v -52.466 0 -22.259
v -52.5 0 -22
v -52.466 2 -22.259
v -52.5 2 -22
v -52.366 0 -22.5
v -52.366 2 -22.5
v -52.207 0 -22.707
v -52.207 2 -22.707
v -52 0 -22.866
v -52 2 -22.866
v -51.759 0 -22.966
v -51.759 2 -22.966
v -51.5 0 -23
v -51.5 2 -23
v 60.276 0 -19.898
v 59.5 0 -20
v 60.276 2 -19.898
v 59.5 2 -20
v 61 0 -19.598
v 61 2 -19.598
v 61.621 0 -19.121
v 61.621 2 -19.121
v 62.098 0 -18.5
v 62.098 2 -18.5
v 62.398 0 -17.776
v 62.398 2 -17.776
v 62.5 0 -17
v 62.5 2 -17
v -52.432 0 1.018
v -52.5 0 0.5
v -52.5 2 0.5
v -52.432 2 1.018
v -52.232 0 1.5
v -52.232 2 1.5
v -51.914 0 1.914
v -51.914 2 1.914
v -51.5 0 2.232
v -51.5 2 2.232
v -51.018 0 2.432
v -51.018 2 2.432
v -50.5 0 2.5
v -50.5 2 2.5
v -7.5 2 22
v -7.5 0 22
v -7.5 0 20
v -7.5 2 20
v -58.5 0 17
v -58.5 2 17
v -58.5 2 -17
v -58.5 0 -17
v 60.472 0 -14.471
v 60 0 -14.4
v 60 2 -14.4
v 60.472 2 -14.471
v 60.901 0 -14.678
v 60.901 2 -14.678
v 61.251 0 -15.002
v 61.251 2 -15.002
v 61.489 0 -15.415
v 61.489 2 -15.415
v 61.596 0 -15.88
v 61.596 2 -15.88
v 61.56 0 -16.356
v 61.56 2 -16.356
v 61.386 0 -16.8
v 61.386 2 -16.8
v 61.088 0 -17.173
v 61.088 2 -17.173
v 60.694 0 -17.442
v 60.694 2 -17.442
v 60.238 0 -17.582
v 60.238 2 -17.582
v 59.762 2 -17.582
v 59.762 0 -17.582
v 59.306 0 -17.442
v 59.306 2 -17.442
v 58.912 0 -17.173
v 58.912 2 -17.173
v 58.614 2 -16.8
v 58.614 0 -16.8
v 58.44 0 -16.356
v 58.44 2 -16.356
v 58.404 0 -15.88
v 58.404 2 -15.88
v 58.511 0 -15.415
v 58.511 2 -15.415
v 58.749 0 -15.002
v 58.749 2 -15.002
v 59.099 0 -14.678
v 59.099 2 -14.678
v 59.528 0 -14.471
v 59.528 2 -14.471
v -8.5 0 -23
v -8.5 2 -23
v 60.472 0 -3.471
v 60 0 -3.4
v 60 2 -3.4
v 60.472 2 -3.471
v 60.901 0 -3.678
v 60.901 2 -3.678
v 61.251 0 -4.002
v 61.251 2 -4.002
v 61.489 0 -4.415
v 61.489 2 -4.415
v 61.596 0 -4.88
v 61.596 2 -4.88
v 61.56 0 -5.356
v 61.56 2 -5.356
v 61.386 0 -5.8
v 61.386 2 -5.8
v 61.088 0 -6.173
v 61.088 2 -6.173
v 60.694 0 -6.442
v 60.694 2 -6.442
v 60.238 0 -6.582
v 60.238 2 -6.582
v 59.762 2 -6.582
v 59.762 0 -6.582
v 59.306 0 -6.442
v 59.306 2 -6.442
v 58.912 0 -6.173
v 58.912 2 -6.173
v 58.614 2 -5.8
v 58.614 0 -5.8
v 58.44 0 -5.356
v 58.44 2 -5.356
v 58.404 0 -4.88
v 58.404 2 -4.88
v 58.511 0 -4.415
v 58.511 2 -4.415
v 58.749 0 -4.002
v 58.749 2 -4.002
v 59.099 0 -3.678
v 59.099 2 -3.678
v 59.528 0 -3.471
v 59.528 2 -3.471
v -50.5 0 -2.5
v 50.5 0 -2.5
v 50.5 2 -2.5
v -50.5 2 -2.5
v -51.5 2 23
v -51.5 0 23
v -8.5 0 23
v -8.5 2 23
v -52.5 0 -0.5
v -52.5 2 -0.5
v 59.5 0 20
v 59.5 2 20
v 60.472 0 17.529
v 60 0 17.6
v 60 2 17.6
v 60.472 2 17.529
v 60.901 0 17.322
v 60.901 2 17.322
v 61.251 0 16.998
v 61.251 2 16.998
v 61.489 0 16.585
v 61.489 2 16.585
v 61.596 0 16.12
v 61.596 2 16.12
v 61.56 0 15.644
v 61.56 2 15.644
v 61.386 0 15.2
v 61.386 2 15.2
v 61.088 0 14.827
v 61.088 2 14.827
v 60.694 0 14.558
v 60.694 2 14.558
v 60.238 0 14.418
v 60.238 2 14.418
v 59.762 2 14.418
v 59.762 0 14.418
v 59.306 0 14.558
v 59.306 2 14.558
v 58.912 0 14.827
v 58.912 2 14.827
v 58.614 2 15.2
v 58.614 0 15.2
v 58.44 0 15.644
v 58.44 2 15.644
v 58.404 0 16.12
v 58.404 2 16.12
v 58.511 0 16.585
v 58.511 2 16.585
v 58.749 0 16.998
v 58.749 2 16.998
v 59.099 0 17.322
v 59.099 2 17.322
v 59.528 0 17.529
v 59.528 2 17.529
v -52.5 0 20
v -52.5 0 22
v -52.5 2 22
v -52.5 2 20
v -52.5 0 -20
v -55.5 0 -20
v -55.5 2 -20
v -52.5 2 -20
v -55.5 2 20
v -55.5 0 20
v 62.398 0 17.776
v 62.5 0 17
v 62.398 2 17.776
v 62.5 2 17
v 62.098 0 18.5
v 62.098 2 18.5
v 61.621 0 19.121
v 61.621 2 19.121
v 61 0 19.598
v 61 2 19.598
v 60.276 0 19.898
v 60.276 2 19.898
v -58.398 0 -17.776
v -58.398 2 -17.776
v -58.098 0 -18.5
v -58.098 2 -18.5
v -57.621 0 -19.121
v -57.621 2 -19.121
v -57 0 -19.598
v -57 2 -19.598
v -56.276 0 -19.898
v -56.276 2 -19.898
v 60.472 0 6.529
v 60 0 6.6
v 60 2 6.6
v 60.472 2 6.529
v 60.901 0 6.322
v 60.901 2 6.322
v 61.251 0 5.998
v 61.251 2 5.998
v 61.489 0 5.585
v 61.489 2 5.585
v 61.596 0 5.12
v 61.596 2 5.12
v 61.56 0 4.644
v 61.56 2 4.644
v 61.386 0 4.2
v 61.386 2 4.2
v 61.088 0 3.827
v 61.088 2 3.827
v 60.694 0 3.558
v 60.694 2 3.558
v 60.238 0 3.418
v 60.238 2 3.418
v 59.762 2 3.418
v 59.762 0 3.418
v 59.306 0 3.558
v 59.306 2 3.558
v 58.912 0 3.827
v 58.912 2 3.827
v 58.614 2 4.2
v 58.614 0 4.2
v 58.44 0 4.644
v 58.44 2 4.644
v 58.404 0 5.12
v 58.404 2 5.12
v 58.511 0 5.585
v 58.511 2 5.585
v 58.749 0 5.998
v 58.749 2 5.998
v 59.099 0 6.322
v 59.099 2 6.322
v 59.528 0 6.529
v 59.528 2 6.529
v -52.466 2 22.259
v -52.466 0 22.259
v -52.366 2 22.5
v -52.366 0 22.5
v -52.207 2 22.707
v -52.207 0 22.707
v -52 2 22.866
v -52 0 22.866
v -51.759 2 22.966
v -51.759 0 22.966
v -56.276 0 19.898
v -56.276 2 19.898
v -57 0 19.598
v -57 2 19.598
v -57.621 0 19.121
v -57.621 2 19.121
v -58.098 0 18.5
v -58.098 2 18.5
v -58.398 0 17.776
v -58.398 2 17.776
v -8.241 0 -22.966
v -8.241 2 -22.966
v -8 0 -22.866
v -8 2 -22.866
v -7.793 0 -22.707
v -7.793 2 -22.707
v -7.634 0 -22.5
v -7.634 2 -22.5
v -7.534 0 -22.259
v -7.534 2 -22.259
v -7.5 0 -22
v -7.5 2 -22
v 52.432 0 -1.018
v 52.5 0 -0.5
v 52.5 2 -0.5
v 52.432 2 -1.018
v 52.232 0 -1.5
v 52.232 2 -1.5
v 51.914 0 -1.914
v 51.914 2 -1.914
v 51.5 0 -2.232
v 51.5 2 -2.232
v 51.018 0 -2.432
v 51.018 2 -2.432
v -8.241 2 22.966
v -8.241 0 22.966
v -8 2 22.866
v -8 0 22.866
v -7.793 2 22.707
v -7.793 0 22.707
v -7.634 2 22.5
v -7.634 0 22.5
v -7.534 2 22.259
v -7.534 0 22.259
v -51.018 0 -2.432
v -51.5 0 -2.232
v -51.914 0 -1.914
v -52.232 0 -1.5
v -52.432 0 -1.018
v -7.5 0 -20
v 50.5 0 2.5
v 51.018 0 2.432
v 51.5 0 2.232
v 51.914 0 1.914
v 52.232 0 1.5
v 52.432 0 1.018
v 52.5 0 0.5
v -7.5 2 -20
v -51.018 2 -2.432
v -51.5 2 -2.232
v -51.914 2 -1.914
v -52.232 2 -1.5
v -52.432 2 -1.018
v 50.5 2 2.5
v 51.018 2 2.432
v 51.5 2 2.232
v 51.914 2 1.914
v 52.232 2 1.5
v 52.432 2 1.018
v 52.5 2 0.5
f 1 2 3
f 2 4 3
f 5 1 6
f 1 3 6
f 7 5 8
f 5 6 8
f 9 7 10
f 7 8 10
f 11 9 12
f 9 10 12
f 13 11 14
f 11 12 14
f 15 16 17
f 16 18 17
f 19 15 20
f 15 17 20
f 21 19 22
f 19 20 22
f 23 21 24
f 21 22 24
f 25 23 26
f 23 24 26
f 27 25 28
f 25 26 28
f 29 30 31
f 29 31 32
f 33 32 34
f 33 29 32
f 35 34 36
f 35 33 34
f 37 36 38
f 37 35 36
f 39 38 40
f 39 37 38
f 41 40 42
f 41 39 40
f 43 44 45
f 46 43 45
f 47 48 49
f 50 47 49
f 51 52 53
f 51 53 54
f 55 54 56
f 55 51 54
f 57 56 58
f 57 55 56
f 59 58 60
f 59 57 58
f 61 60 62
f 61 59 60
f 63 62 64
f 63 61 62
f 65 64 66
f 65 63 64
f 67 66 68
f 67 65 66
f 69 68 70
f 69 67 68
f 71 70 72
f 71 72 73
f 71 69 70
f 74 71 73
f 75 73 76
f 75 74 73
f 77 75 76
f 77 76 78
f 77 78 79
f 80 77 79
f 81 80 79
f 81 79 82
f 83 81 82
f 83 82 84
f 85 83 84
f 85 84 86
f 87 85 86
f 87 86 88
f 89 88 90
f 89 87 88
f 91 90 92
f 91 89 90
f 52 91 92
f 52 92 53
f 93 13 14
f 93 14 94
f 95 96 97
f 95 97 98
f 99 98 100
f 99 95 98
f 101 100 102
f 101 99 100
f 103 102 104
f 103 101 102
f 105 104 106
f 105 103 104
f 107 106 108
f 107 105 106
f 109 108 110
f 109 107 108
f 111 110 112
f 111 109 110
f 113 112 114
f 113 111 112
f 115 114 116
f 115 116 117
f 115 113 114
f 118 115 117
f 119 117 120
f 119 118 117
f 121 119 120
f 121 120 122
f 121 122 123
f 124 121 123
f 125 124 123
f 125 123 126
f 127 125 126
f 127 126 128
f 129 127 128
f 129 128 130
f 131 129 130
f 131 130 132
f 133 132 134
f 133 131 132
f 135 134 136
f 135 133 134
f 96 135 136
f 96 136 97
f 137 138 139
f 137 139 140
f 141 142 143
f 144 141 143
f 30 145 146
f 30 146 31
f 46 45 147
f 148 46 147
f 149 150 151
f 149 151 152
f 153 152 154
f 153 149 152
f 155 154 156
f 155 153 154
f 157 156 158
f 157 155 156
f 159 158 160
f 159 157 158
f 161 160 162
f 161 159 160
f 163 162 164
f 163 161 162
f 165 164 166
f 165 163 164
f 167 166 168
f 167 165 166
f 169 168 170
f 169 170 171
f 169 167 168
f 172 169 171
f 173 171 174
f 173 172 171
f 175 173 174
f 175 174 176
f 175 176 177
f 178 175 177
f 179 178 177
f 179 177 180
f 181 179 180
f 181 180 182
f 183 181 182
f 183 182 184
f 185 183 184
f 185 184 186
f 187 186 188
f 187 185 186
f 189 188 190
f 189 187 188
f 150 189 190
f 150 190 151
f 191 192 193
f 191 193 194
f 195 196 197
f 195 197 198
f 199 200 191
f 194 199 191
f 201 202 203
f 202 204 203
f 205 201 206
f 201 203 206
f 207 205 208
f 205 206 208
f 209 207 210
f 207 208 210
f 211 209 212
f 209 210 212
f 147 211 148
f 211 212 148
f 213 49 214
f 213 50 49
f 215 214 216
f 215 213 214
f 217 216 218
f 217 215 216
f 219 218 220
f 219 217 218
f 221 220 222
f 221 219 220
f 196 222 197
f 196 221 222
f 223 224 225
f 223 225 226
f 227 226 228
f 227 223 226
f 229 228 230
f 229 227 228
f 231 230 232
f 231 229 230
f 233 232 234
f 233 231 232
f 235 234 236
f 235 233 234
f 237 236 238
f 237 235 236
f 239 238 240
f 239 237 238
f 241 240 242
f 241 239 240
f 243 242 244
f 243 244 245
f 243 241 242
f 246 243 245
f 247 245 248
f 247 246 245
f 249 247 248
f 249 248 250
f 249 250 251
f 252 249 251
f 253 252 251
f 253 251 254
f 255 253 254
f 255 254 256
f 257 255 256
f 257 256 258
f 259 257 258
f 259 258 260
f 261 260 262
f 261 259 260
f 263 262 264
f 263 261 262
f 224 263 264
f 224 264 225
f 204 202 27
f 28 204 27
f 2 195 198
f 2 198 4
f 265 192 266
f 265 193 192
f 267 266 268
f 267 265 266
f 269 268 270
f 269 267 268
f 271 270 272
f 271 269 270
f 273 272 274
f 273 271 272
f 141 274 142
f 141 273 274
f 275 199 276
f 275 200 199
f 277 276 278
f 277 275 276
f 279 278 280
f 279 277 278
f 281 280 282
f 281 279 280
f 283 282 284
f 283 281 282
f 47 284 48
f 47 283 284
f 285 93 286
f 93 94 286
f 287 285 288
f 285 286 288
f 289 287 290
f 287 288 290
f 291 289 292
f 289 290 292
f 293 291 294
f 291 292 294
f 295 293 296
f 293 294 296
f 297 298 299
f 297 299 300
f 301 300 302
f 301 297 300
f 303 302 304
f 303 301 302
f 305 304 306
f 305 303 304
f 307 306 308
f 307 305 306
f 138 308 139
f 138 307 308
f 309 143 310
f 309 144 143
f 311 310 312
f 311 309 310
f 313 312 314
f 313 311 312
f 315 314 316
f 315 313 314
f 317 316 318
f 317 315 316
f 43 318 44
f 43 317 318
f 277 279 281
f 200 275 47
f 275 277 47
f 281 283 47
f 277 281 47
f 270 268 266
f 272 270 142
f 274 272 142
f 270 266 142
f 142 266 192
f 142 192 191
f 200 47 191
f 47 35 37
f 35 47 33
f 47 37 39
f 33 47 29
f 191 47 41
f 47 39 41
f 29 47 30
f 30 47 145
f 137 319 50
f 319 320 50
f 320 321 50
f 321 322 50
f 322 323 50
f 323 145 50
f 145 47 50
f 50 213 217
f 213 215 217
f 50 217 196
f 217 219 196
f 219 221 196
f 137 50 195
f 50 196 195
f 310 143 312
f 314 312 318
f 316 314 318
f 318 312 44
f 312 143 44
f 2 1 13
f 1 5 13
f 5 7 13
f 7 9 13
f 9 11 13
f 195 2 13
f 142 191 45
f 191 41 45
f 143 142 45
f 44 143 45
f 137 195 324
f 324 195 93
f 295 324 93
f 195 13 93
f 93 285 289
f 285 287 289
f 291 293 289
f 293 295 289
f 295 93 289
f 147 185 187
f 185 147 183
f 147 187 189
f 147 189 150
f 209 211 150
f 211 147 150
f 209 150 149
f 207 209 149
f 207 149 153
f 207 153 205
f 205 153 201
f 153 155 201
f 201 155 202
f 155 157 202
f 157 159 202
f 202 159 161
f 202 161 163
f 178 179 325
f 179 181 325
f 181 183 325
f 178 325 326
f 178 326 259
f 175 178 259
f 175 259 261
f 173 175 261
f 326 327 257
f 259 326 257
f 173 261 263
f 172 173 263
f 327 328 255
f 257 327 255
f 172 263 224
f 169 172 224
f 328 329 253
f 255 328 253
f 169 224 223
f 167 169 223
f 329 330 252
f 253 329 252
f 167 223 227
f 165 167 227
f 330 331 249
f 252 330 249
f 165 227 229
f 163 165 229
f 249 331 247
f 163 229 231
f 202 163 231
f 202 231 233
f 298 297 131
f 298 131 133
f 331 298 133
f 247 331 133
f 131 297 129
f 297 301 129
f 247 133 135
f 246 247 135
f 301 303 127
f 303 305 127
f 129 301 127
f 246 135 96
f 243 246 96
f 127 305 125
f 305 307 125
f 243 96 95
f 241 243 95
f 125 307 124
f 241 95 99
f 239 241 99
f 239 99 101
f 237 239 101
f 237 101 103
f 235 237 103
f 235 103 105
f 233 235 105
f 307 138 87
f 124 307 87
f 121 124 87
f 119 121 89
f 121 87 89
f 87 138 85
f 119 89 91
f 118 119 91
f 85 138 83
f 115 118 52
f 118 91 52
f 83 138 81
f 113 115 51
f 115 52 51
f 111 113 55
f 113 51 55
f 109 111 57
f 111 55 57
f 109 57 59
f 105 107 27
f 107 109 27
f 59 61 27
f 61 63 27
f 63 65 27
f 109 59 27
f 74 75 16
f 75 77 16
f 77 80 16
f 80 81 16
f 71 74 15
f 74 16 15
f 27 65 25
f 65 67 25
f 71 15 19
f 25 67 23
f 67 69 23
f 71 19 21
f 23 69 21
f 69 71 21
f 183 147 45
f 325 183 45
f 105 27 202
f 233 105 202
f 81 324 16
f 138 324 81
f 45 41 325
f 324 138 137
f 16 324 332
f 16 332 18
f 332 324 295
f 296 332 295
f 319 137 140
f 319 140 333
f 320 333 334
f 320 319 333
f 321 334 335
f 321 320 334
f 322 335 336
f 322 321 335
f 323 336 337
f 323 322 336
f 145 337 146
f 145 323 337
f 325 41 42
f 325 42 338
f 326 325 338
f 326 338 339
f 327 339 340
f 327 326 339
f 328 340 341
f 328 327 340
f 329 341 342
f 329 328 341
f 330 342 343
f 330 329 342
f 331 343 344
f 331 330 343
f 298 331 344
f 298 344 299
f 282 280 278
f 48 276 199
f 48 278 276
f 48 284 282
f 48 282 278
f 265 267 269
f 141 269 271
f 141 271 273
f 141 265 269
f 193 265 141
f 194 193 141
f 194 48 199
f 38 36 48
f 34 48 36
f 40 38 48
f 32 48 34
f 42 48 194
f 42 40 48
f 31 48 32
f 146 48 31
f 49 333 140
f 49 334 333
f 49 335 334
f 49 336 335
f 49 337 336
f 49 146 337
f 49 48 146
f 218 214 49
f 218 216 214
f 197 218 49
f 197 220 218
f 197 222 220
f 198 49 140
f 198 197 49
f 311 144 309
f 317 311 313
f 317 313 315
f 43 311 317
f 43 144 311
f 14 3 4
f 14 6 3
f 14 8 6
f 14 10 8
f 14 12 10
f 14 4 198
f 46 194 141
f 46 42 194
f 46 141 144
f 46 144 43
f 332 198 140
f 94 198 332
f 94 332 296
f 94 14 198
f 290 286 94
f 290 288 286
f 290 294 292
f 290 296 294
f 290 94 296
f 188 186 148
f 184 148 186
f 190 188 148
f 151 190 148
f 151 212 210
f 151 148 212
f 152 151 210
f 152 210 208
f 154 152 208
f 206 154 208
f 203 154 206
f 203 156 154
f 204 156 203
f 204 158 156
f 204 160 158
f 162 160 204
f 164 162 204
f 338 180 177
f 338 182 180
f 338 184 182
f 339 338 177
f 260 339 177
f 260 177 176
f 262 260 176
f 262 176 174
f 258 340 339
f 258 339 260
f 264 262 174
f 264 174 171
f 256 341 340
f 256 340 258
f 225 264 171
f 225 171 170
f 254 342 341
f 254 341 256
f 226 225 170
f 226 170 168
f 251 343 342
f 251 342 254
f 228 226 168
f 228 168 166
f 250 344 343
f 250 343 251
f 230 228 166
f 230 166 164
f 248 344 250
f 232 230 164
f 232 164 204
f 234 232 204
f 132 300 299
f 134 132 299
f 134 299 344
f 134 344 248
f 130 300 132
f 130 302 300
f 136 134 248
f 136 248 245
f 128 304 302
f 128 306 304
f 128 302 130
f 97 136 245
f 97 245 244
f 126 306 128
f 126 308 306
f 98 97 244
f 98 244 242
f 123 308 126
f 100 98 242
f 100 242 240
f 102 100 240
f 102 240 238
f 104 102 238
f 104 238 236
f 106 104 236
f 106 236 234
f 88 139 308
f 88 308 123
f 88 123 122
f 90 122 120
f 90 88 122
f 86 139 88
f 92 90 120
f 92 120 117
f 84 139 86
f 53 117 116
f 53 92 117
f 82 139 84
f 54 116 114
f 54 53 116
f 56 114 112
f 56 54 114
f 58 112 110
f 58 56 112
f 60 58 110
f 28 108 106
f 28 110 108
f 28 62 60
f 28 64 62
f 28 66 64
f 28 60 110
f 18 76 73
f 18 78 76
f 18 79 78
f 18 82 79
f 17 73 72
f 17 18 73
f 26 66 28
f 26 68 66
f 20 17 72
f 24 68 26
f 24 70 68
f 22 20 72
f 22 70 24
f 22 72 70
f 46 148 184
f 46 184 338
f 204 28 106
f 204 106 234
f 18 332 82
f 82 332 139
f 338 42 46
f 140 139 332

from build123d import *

# Parameters (mm, degrees)
SKETCH_1_W          = 125
SKETCH_1_H          = 40
SKETCH_1_R          = 1.6
SKETCH_1_W_2        = 45
SKETCH_1_H_2        = 3
EXTRUDE_1_DEPTH     = 2
SKETCH_2_W          = 4
SKETCH_2_H          = 40
CUT_EXTRUDE_1_DEPTH = 10
FILLET_1_R          = 3
FILLET_2_R          = 1


with BuildPart() as part:
    # 草图1 → 凸台-拉伸1 (new body)
    # profile 1 of 3: a face of its own
    with BuildSketch(Plane(origin=(0, 0, 0), x_dir=(1, 0, 0), z_dir=(0, 1, 0))):
        Rectangle(SKETCH_1_W, SKETCH_1_H)
        with Locations(Location((60, 16, 0), (0, 0, 270))):
            Circle(SKETCH_1_R, mode=Mode.SUBTRACT)
        with Locations(Location((60, 5, 0), (0, 0, 270))):
            Circle(SKETCH_1_R, mode=Mode.SUBTRACT)
        with Locations(Location((60, -5, 0), (0, 0, 270))):
            Circle(SKETCH_1_R, mode=Mode.SUBTRACT)
        with Locations(Location((60, -16, 0), (0, 0, 270))):
            Circle(SKETCH_1_R, mode=Mode.SUBTRACT)
        with BuildLine():
            Line((-50.5, -2.5), (50.5, -2.5))
            ThreePointArc((50.5, -2.5), (51.914213562, -1.914213562), (52.5, -0.5))
            Line((52.5, -0.5), (52.5, 0.5))
            ThreePointArc((52.5, 0.5), (51.914213562, 1.914213562), (50.5, 2.5))
            Line((50.5, 2.5), (-50.5, 2.5))
            ThreePointArc((-50.5, 2.5), (-51.914213562, 1.914213562), (-52.5, 0.5))
            Line((-52.5, 0.5), (-52.5, -0.5))
            ThreePointArc((-52.5, -0.5), (-51.914213562, -1.914213562), (-50.5, -2.5))
        make_face(mode=Mode.SUBTRACT)
    # profile 2 of 3: a face of its own
    with BuildSketch(Plane(origin=(0, 0, 0), x_dir=(1, 0, 0), z_dir=(0, 1, 0))):
        with Locations((-30, -21.5)):
            Rectangle(SKETCH_1_W_2, SKETCH_1_H_2)
    # profile 3 of 3: a face of its own
    with BuildSketch(Plane(origin=(0, 0, 0), x_dir=(1, 0, 0), z_dir=(0, 1, 0))):
        with Locations((-30, 21.5)):
            Rectangle(SKETCH_1_W_2, SKETCH_1_H_2)
    extrude(amount=EXTRUDE_1_DEPTH)

    # 草图2 → 切除-拉伸1 (cut)
    with BuildSketch(Plane(origin=(0, 2, 0), x_dir=(1, 0, 0), z_dir=(0, 1, 0))):
        with Locations((-60.5, 0)):
            Rectangle(SKETCH_2_W, SKETCH_2_H)
    extrude(amount=-CUT_EXTRUDE_1_DEPTH, mode=Mode.SUBTRACT)

    # 圆角1
    fillet_1_edges = [part.edges().sort_by_distance(p)[0] for p in [
        (62.5, 1, -20),
        (62.5, 1, 20),
        (-58.5, 1, -20),
        (-58.5, 1, 20),
    ]]
    fillet(fillet_1_edges, radius=FILLET_1_R)

    # 圆角2
    fillet_2_edges = [part.edges().sort_by_distance(p)[0] for p in [
        (-52.5, 1, -23),
        (-7.5, 1, -23),
        (-7.5, 1, 23),
        (-52.5, 1, 23),
    ]]
    fillet(fillet_2_edges, radius=FILLET_2_R)


solid = part.part
